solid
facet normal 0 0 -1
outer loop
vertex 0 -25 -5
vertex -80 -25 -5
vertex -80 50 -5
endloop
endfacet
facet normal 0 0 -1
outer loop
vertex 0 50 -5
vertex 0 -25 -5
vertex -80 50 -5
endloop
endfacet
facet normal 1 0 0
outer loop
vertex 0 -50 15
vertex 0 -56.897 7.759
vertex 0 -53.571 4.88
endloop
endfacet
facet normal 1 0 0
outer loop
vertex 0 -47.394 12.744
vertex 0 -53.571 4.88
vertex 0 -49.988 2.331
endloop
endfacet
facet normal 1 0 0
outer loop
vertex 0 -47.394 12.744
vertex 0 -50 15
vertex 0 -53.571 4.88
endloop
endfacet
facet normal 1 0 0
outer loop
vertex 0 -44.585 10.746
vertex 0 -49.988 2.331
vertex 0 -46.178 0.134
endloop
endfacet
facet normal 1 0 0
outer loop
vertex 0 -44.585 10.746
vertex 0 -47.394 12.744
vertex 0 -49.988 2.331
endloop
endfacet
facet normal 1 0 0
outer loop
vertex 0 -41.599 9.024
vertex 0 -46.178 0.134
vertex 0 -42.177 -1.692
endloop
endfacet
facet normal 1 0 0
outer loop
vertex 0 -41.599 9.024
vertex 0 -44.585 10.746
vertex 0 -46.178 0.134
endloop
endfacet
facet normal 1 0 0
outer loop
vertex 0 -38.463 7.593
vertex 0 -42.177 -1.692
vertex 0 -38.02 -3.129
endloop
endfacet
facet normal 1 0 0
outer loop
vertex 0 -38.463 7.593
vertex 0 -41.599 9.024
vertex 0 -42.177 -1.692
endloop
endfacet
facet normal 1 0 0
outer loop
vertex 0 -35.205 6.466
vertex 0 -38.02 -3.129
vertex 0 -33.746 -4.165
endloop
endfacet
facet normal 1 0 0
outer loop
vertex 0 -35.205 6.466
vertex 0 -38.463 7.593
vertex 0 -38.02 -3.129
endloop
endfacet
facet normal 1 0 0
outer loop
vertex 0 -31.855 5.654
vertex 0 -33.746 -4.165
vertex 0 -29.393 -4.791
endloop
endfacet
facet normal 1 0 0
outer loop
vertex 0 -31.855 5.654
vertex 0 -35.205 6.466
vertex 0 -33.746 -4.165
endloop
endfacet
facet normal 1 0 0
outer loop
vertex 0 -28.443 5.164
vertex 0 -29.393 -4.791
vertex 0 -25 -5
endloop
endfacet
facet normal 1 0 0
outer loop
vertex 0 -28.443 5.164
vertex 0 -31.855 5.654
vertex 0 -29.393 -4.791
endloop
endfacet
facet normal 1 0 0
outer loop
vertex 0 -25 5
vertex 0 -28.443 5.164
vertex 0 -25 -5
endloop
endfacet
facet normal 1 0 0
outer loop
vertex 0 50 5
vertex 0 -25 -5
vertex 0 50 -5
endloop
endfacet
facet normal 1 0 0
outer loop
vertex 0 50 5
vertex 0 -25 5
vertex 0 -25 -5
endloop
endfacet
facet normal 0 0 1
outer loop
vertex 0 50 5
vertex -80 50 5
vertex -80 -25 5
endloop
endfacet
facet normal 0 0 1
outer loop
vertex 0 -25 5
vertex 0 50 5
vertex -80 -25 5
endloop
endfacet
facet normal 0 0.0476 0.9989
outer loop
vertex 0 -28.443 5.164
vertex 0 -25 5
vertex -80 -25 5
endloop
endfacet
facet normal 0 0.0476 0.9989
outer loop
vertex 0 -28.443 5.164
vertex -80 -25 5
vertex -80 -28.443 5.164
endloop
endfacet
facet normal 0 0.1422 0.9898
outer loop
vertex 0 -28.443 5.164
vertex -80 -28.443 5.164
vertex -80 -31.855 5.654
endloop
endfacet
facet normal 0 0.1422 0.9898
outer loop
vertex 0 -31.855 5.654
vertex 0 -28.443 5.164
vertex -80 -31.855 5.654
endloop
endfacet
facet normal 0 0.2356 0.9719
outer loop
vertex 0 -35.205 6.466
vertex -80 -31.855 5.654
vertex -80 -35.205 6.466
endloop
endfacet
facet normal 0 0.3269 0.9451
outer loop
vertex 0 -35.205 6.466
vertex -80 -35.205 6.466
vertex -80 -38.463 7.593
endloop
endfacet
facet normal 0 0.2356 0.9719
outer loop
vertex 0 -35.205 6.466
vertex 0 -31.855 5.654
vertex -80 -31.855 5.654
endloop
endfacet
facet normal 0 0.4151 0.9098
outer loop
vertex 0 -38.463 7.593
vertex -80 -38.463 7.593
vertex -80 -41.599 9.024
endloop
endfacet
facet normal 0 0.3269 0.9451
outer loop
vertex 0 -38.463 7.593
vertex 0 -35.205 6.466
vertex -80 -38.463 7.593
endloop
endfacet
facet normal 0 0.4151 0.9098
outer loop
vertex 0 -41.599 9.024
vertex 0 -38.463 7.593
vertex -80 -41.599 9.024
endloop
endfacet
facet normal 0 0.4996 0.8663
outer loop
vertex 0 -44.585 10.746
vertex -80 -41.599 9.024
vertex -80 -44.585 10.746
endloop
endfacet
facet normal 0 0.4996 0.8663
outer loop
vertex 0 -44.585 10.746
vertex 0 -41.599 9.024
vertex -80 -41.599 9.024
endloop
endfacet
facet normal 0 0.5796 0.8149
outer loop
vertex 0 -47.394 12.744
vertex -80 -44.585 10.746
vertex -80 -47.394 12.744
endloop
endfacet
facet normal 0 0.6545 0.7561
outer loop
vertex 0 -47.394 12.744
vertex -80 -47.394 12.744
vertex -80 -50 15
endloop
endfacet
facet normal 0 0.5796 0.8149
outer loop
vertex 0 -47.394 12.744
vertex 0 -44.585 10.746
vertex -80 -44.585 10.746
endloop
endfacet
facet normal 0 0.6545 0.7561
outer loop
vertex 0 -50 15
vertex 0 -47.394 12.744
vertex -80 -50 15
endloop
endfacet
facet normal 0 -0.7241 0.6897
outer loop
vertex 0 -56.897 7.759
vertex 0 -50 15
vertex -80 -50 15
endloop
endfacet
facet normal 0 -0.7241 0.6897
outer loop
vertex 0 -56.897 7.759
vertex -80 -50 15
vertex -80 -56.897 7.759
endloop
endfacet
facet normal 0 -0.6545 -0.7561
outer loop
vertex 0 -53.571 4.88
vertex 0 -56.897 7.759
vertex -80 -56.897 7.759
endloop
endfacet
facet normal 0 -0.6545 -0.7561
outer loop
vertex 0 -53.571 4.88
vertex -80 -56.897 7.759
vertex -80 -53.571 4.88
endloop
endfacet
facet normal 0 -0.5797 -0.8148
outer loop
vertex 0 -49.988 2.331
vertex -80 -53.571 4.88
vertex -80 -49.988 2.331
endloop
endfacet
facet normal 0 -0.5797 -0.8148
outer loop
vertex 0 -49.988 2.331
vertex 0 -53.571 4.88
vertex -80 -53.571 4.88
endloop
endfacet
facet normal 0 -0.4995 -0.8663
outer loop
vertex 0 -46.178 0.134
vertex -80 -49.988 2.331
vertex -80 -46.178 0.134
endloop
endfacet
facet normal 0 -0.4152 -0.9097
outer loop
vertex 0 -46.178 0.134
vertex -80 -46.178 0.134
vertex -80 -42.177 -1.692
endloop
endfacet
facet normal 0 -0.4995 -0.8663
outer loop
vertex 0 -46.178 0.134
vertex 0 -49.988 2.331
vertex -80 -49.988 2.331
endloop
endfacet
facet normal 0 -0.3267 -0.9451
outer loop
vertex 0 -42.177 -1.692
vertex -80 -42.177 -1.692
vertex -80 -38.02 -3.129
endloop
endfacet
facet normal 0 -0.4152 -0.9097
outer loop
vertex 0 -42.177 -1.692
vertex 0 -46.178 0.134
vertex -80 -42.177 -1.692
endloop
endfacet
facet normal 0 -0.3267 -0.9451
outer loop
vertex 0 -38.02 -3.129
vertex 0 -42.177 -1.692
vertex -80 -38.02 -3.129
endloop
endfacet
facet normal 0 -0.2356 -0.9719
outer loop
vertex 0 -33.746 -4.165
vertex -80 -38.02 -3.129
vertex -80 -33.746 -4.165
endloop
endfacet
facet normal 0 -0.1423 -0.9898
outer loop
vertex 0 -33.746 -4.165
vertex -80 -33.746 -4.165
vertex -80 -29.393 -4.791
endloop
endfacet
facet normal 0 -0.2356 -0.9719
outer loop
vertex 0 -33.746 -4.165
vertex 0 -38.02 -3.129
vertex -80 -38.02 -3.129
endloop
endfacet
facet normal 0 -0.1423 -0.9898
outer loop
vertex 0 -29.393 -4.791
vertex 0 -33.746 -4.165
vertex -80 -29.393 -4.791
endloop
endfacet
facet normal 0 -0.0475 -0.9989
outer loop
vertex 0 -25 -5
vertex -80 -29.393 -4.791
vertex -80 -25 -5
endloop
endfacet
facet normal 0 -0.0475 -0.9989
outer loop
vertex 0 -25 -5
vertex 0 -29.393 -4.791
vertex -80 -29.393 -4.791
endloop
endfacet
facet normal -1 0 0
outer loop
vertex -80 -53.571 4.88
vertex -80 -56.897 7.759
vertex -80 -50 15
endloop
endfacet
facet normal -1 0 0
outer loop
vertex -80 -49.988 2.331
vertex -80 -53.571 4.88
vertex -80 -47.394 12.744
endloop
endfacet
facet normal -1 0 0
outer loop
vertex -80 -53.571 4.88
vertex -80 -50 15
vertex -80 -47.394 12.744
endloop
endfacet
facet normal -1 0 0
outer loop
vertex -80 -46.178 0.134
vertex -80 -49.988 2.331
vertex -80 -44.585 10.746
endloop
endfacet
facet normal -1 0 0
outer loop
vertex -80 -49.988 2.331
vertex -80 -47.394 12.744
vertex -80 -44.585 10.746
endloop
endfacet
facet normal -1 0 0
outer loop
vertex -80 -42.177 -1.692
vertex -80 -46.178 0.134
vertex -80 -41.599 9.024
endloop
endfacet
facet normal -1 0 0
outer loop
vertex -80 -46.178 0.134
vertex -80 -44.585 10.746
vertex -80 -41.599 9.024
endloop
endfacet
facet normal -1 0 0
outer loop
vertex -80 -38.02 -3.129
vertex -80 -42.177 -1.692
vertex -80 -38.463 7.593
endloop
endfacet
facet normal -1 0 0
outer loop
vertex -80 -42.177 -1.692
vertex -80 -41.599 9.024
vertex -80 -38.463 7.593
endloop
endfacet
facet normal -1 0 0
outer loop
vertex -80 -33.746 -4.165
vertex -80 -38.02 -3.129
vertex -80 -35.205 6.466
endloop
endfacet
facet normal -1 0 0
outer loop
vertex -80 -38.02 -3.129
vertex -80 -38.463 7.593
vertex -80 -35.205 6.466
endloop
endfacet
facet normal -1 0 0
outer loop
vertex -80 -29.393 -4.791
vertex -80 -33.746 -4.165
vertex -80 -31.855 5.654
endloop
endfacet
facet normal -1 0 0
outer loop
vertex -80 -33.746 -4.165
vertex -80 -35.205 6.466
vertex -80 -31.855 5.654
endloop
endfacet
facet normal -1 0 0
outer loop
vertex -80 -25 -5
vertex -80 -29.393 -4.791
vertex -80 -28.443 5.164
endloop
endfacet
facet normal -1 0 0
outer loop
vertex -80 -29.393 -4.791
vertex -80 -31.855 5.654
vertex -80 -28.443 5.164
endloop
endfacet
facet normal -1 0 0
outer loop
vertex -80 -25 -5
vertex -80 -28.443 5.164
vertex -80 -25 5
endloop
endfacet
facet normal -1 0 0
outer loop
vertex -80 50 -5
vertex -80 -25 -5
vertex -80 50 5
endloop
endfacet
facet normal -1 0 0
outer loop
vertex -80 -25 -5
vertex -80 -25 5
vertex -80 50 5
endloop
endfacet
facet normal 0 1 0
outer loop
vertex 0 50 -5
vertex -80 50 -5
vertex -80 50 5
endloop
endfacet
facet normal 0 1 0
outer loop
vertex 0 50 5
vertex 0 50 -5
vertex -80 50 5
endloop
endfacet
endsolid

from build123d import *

# Parameters (mm, degrees)
F1_DEPTH = 80


with BuildPart() as f1:
    # F0 (on Right) → F1 (new body)
    with BuildSketch(Plane.YZ):
        with BuildLine():
            Line((-25, -5), (50, -5))
            Line((50, -5), (50, 5))
            Line((50, 5), (-25, 5))
            ThreePointArc((-25, 5), (-38.462912, 7.59272), (-50, 15))
            Line((-50, 15), (-56.896552, 7.758621))
            ThreePointArc((-56.896552, 7.758621), (-42.176819, -1.692047), (-25, -5))
        make_face()
    extrude(amount=-F1_DEPTH)


solid = f1.part
